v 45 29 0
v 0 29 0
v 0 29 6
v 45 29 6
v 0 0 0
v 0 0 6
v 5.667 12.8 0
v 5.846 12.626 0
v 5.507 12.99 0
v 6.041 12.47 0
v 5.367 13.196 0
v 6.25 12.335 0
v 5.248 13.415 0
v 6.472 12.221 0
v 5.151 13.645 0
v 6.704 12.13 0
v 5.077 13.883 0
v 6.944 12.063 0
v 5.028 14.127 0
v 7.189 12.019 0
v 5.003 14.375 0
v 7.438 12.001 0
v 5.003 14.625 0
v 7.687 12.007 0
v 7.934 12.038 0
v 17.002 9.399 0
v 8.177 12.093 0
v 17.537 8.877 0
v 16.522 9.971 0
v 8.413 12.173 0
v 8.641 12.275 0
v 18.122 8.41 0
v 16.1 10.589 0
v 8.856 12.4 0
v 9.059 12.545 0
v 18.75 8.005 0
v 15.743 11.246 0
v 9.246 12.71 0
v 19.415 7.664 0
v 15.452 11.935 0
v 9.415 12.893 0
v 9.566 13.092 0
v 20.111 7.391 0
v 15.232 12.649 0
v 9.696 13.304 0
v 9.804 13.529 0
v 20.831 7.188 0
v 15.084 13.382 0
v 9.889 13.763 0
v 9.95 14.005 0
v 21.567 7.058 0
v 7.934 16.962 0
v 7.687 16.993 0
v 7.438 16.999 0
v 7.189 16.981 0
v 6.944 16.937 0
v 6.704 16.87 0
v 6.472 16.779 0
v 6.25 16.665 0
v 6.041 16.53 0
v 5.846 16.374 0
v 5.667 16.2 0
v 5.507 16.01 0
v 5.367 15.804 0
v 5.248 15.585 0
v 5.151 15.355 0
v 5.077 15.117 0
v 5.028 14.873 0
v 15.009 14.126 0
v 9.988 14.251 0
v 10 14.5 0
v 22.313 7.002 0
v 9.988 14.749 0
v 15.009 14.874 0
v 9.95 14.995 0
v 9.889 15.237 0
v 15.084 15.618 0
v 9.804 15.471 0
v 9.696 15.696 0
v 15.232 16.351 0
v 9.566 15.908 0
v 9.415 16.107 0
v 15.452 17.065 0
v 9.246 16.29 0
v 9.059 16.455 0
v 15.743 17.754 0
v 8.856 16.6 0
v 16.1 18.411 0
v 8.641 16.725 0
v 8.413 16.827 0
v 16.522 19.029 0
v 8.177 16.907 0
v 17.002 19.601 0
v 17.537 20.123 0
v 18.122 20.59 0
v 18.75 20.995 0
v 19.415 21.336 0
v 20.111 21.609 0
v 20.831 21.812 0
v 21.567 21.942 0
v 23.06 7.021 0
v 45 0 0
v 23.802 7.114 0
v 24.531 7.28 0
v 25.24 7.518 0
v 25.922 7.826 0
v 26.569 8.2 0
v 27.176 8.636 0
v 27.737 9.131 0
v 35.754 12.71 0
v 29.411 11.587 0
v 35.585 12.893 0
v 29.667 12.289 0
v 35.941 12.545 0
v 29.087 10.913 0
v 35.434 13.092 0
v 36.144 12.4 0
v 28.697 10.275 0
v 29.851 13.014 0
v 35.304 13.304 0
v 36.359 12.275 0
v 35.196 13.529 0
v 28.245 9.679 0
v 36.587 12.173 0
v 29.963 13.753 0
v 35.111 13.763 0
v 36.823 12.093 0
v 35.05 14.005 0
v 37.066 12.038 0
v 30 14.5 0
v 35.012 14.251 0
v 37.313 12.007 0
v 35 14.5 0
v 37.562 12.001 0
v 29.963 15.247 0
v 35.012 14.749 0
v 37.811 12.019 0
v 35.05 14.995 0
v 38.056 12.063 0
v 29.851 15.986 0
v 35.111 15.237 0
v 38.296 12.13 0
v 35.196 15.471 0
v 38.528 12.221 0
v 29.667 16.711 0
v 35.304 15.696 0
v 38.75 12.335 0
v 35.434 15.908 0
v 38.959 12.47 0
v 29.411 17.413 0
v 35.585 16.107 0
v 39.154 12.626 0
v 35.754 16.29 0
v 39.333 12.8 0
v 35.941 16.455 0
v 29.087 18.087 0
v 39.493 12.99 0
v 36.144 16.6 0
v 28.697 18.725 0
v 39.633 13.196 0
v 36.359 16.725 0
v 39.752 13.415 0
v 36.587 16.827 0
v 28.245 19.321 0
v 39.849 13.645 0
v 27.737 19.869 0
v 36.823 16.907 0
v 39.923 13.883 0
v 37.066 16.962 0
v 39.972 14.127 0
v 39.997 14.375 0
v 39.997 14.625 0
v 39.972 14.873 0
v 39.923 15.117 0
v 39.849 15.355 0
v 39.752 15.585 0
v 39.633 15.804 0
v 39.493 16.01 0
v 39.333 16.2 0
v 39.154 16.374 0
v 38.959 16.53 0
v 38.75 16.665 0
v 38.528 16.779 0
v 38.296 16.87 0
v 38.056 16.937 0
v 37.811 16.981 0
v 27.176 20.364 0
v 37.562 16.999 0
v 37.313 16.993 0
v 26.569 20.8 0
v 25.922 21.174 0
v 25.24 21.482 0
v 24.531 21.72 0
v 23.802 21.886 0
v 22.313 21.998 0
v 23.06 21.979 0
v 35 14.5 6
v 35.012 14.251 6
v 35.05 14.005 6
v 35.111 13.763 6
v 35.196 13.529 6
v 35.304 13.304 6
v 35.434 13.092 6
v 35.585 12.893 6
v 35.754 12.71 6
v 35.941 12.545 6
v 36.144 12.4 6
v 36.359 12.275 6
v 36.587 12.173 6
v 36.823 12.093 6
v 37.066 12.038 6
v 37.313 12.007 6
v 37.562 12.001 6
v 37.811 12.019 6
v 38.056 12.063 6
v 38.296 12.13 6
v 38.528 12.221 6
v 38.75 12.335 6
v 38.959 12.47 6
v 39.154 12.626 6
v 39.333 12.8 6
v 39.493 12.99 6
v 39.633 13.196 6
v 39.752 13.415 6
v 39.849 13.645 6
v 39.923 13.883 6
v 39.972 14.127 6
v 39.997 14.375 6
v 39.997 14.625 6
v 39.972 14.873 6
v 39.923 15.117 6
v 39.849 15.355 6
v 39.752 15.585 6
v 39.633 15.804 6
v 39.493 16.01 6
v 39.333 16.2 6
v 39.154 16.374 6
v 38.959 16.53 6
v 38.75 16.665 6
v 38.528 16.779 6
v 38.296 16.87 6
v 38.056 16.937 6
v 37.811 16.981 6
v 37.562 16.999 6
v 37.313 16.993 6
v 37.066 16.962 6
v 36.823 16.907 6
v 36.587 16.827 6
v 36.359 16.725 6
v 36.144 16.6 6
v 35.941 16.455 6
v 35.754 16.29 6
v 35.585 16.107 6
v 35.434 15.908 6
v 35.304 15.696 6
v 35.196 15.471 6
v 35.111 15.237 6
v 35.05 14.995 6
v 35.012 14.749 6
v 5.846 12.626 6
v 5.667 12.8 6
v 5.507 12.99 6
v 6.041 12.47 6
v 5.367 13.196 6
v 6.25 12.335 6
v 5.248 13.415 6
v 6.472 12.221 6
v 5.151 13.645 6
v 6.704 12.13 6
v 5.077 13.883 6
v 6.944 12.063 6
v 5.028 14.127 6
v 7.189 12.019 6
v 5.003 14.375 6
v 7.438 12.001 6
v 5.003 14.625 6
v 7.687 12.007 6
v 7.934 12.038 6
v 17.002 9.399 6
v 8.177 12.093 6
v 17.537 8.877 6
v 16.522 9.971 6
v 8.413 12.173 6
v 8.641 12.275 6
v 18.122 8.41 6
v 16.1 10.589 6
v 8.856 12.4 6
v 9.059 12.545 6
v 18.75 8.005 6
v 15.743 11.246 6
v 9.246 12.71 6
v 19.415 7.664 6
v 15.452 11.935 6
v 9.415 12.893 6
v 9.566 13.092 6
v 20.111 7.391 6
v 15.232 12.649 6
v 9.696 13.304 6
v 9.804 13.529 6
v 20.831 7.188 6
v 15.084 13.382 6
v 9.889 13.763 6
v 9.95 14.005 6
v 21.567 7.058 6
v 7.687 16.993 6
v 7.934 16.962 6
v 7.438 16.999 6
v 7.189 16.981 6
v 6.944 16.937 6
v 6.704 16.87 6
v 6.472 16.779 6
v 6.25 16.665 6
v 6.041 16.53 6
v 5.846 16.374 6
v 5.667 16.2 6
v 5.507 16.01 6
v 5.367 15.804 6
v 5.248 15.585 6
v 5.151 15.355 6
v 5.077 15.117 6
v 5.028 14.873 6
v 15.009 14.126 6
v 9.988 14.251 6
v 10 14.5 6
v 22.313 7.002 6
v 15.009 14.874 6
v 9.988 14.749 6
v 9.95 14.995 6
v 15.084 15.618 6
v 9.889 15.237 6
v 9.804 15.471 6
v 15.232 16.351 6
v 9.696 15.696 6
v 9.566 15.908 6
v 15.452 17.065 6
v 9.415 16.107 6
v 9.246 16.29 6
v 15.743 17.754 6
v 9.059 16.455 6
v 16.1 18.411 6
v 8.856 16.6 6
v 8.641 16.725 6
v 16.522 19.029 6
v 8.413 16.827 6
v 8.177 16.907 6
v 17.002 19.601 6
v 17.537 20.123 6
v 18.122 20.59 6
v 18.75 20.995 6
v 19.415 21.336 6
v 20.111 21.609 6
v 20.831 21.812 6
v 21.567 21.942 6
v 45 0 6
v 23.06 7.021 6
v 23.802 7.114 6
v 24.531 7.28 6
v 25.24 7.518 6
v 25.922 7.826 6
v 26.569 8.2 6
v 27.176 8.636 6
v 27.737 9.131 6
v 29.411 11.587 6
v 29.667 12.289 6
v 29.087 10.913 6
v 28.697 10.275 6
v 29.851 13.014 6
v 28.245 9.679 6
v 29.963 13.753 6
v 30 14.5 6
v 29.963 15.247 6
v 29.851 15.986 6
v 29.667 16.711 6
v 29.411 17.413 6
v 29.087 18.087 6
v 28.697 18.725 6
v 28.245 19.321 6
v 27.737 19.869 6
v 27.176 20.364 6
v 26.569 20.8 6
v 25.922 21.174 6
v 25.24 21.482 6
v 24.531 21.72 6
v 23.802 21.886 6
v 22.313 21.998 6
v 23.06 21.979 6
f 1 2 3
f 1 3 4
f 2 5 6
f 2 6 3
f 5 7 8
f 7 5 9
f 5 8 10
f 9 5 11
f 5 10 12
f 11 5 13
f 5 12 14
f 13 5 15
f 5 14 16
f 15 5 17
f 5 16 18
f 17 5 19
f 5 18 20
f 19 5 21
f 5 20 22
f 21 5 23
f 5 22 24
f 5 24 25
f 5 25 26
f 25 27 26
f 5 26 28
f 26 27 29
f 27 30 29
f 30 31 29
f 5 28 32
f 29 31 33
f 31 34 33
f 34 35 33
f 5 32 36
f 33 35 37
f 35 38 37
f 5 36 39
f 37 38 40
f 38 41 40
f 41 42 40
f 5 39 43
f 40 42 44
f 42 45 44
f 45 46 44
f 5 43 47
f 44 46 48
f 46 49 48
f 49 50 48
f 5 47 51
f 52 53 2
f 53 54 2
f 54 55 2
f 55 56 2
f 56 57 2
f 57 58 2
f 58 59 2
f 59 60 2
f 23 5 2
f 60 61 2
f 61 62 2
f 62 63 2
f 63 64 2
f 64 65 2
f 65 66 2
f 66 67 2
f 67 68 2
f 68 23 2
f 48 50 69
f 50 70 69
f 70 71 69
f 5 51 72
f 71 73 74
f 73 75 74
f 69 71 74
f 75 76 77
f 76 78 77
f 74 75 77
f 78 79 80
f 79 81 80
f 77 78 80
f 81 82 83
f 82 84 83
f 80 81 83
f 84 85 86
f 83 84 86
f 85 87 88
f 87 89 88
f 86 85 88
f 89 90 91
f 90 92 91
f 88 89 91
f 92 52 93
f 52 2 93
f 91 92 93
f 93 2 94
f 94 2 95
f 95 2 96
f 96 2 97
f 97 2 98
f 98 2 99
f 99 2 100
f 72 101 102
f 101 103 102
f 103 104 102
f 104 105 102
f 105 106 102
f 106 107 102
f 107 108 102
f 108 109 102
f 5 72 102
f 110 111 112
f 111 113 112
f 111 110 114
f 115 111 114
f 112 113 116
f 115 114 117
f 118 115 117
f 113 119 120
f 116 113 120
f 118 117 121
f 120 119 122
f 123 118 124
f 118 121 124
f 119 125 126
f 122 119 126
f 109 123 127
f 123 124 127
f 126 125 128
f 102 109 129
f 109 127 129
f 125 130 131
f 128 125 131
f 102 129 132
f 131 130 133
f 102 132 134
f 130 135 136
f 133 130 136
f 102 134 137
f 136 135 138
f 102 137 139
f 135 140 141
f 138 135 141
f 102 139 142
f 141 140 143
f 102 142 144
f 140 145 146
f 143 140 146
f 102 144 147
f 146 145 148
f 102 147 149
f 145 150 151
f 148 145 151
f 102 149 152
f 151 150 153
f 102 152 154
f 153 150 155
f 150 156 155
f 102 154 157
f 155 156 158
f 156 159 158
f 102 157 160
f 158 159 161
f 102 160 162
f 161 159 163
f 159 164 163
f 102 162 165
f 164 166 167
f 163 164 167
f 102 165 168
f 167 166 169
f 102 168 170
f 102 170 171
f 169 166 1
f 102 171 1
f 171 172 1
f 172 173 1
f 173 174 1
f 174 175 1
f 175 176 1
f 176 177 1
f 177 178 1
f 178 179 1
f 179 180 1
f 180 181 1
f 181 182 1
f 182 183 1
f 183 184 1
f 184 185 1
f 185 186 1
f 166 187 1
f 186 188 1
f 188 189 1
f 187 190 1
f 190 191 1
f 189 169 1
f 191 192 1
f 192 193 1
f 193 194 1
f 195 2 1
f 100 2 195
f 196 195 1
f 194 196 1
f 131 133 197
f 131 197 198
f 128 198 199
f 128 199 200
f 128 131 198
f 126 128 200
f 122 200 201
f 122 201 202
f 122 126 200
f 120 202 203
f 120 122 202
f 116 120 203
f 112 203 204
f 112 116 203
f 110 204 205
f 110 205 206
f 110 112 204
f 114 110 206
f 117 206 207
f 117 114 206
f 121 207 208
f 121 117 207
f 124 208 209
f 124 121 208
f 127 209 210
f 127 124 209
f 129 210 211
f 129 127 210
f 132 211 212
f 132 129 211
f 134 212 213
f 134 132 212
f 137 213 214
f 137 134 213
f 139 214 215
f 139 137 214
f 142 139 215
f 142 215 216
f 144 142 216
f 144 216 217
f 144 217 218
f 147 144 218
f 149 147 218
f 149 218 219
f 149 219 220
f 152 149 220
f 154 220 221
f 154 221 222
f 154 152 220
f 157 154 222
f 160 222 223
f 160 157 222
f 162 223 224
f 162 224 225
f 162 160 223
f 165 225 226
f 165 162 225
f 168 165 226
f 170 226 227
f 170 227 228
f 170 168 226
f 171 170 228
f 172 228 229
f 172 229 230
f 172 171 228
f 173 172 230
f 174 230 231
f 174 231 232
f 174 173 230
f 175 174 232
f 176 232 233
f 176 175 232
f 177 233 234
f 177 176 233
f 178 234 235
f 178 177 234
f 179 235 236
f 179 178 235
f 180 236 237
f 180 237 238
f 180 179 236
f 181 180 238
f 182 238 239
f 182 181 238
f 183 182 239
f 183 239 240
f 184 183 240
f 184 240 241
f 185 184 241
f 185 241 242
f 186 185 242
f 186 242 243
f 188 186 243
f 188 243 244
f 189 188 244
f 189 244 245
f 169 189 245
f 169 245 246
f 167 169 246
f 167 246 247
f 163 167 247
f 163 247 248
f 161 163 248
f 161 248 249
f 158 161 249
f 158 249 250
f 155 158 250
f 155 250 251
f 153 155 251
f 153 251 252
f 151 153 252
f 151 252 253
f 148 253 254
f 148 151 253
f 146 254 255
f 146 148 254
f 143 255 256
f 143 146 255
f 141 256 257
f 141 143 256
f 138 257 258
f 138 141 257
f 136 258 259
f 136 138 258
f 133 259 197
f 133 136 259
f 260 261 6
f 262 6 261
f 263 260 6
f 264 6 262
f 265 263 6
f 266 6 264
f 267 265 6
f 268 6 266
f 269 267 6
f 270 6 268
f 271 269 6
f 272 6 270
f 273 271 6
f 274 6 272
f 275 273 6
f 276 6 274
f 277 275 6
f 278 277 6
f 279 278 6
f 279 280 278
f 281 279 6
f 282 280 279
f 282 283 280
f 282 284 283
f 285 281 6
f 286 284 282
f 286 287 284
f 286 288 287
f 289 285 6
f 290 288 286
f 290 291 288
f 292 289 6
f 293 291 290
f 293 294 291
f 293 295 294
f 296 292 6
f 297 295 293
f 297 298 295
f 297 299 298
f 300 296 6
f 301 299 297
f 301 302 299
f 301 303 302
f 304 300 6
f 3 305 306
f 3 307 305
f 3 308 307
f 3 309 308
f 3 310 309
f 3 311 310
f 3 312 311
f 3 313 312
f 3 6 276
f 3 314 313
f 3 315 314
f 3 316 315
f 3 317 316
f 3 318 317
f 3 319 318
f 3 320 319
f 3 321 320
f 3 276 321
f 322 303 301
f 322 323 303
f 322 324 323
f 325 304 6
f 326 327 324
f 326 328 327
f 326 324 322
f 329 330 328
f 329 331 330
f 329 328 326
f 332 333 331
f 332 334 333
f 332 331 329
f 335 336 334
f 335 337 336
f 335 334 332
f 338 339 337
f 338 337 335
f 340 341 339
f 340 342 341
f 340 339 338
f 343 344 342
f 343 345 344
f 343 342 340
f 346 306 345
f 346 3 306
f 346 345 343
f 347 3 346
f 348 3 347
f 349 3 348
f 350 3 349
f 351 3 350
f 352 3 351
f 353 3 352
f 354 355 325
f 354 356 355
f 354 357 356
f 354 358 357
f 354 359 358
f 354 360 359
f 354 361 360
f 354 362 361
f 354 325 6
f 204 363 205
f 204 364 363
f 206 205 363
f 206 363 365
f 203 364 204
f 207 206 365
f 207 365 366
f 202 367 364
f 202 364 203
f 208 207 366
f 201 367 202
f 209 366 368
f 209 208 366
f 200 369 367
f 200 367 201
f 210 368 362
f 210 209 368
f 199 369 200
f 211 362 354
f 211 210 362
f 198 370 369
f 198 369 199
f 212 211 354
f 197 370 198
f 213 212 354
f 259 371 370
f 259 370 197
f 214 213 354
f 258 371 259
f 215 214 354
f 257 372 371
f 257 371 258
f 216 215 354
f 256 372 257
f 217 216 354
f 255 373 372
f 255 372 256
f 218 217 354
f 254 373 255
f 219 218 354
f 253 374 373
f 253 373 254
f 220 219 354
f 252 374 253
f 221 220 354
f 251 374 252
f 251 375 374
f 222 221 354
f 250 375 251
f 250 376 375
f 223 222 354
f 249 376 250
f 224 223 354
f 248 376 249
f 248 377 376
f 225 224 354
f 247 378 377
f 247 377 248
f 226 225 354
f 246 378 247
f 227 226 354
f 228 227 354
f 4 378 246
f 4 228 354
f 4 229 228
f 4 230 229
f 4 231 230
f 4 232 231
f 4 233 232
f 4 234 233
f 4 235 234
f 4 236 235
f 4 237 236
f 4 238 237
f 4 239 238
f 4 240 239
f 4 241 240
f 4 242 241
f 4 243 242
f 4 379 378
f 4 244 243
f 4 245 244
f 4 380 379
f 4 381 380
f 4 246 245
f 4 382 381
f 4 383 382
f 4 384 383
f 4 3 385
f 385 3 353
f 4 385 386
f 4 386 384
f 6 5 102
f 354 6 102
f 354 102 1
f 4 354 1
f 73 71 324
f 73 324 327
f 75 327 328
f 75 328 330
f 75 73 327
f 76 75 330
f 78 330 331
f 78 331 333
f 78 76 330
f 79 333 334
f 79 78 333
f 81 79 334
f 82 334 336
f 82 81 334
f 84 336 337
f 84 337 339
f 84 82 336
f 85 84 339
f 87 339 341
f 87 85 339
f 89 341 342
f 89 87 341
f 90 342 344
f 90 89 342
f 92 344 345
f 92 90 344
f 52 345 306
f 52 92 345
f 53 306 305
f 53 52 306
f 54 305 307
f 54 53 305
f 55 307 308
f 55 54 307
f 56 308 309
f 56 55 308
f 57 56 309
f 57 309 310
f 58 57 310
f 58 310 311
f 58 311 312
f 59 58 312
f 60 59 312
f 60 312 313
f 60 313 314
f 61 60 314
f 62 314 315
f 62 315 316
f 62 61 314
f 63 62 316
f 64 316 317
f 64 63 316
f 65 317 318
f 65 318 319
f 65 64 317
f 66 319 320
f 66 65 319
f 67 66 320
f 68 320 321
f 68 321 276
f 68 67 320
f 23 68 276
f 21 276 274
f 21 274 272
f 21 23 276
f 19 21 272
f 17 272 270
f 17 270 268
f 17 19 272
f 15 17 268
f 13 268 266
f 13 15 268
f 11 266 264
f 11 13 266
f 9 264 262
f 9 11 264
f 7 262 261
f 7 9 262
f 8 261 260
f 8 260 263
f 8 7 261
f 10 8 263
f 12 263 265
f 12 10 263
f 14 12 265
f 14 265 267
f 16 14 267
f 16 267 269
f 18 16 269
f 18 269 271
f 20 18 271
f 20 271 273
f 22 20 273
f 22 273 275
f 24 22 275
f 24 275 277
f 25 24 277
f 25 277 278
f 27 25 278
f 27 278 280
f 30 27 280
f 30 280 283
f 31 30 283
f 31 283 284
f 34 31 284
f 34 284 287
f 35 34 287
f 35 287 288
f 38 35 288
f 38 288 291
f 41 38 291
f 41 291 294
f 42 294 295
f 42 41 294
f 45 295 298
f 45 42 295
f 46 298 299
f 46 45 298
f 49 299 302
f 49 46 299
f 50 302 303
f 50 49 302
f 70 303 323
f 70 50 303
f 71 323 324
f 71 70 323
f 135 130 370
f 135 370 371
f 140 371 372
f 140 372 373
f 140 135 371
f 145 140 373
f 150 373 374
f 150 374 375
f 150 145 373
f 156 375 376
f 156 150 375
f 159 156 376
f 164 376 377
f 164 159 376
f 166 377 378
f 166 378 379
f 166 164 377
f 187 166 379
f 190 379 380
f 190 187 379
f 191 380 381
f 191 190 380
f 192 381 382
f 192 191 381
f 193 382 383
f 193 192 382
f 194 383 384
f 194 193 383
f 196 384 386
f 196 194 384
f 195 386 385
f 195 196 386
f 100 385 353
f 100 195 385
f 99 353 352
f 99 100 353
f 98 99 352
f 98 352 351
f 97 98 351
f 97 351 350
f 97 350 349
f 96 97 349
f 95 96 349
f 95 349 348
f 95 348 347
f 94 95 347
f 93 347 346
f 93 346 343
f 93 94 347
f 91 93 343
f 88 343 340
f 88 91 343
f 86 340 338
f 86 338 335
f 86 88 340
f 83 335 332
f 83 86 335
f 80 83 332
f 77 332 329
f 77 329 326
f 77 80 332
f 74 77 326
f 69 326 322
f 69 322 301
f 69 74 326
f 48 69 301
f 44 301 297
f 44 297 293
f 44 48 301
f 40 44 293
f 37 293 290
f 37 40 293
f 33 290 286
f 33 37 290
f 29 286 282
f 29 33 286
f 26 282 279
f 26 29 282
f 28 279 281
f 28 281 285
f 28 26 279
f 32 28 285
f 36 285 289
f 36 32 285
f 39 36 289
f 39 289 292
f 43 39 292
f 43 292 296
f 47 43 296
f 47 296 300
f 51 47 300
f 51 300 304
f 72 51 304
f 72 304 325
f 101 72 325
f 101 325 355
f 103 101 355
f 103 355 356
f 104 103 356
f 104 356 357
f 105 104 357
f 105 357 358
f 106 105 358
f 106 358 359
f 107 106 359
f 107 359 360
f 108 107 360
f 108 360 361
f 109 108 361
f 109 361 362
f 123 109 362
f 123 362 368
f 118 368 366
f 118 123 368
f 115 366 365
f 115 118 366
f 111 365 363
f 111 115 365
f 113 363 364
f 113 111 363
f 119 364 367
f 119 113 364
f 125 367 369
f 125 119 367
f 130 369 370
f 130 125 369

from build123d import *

# Parameters (mm, degrees)
SKETCH1_W           = 45
SKETCH1_H           = 29
SKETCH1_R           = 7.5
SKETCH1_R_2         = 2.5
BOSS_EXTRUDE1_DEPTH = 6


with BuildPart() as part:
    # Sketch1 → Boss-Extrude1 (new body)
    with BuildSketch(Plane.XY):
        with Locations((22.5, 14.5)):
            Rectangle(SKETCH1_W, SKETCH1_H)
        with Locations((22.5, 14.5)):
            Circle(SKETCH1_R, mode=Mode.SUBTRACT)
        with Locations((7.5, 14.5)):
            Circle(SKETCH1_R_2, mode=Mode.SUBTRACT)
        with Locations(Location((37.5, 14.5, 0), (0, 0, 180))):
            Circle(SKETCH1_R_2, mode=Mode.SUBTRACT)
    extrude(amount=BOSS_EXTRUDE1_DEPTH)


solid = part.part
